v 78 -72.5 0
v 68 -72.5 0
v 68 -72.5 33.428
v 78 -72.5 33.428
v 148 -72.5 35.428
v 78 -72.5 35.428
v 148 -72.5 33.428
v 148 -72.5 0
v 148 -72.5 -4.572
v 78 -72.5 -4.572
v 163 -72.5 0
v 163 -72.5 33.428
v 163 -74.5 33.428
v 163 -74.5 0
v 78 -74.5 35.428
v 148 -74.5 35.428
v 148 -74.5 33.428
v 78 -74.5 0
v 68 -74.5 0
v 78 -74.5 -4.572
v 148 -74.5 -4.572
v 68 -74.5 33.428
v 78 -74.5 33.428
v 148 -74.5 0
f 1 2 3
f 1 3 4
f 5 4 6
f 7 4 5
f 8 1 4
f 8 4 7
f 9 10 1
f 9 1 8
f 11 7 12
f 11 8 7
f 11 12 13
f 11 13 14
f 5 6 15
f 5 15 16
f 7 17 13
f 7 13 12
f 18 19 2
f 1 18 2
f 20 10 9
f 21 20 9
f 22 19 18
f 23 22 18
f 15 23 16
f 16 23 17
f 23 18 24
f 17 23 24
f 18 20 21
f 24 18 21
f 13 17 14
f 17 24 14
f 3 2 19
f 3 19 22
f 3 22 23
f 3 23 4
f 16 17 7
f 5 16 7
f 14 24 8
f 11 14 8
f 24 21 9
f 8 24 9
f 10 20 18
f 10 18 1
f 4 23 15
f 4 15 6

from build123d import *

# Parameters (mm, degrees)
ESTRUSIONE_ESTRUSIONE1_DEPTH      = 35.42788
ESTRUSIONE_ESTRUSIONE1_DEPTH_BACK = 4.57212
SCHIZZO1_W                        = 70
SCHIZZO1_H                        = 2
SCHIZZO2_W                        = 33.42788034
SCHIZZO2_H                        = 2
ESTRUSIONE_ESTRUSIONE2_DEPTH      = 15
SCHIZZO3_W                        = 33.42788034
SCHIZZO3_H                        = 2
ESTRUSIONE_ESTRUSIONE3_DEPTH      = 10


with BuildPart() as part:
    # Schizzo1 → Estrusione-Estrusione1 (new, two sides: drawn at the far end of the back side and taken through both)
    with BuildSketch(Plane.XY.offset(-ESTRUSIONE_ESTRUSIONE1_DEPTH_BACK)):
        with Locations((113, -73.5)):
            Rectangle(SCHIZZO1_W, SCHIZZO1_H)
    extrude(amount=ESTRUSIONE_ESTRUSIONE1_DEPTH + ESTRUSIONE_ESTRUSIONE1_DEPTH_BACK)

    # Schizzo2 → Estrusione-Estrusione2 (add)
    with BuildSketch(Plane(origin=(148, 0, 0), x_dir=(0, 0, -1), z_dir=(1, 0, 0))):
        with Locations((-16.71394017, -73.5)):
            Rectangle(SCHIZZO2_W, SCHIZZO2_H)
    extrude(amount=ESTRUSIONE_ESTRUSIONE2_DEPTH)

    # Schizzo3 → Estrusione-Estrusione3 (add)
    with BuildSketch(Plane.ZY.offset(-78)):
        with Locations((16.71394017, -73.5)):
            Rectangle(SCHIZZO3_W, SCHIZZO3_H)
    extrude(amount=ESTRUSIONE_ESTRUSIONE3_DEPTH)


solid = part.part
